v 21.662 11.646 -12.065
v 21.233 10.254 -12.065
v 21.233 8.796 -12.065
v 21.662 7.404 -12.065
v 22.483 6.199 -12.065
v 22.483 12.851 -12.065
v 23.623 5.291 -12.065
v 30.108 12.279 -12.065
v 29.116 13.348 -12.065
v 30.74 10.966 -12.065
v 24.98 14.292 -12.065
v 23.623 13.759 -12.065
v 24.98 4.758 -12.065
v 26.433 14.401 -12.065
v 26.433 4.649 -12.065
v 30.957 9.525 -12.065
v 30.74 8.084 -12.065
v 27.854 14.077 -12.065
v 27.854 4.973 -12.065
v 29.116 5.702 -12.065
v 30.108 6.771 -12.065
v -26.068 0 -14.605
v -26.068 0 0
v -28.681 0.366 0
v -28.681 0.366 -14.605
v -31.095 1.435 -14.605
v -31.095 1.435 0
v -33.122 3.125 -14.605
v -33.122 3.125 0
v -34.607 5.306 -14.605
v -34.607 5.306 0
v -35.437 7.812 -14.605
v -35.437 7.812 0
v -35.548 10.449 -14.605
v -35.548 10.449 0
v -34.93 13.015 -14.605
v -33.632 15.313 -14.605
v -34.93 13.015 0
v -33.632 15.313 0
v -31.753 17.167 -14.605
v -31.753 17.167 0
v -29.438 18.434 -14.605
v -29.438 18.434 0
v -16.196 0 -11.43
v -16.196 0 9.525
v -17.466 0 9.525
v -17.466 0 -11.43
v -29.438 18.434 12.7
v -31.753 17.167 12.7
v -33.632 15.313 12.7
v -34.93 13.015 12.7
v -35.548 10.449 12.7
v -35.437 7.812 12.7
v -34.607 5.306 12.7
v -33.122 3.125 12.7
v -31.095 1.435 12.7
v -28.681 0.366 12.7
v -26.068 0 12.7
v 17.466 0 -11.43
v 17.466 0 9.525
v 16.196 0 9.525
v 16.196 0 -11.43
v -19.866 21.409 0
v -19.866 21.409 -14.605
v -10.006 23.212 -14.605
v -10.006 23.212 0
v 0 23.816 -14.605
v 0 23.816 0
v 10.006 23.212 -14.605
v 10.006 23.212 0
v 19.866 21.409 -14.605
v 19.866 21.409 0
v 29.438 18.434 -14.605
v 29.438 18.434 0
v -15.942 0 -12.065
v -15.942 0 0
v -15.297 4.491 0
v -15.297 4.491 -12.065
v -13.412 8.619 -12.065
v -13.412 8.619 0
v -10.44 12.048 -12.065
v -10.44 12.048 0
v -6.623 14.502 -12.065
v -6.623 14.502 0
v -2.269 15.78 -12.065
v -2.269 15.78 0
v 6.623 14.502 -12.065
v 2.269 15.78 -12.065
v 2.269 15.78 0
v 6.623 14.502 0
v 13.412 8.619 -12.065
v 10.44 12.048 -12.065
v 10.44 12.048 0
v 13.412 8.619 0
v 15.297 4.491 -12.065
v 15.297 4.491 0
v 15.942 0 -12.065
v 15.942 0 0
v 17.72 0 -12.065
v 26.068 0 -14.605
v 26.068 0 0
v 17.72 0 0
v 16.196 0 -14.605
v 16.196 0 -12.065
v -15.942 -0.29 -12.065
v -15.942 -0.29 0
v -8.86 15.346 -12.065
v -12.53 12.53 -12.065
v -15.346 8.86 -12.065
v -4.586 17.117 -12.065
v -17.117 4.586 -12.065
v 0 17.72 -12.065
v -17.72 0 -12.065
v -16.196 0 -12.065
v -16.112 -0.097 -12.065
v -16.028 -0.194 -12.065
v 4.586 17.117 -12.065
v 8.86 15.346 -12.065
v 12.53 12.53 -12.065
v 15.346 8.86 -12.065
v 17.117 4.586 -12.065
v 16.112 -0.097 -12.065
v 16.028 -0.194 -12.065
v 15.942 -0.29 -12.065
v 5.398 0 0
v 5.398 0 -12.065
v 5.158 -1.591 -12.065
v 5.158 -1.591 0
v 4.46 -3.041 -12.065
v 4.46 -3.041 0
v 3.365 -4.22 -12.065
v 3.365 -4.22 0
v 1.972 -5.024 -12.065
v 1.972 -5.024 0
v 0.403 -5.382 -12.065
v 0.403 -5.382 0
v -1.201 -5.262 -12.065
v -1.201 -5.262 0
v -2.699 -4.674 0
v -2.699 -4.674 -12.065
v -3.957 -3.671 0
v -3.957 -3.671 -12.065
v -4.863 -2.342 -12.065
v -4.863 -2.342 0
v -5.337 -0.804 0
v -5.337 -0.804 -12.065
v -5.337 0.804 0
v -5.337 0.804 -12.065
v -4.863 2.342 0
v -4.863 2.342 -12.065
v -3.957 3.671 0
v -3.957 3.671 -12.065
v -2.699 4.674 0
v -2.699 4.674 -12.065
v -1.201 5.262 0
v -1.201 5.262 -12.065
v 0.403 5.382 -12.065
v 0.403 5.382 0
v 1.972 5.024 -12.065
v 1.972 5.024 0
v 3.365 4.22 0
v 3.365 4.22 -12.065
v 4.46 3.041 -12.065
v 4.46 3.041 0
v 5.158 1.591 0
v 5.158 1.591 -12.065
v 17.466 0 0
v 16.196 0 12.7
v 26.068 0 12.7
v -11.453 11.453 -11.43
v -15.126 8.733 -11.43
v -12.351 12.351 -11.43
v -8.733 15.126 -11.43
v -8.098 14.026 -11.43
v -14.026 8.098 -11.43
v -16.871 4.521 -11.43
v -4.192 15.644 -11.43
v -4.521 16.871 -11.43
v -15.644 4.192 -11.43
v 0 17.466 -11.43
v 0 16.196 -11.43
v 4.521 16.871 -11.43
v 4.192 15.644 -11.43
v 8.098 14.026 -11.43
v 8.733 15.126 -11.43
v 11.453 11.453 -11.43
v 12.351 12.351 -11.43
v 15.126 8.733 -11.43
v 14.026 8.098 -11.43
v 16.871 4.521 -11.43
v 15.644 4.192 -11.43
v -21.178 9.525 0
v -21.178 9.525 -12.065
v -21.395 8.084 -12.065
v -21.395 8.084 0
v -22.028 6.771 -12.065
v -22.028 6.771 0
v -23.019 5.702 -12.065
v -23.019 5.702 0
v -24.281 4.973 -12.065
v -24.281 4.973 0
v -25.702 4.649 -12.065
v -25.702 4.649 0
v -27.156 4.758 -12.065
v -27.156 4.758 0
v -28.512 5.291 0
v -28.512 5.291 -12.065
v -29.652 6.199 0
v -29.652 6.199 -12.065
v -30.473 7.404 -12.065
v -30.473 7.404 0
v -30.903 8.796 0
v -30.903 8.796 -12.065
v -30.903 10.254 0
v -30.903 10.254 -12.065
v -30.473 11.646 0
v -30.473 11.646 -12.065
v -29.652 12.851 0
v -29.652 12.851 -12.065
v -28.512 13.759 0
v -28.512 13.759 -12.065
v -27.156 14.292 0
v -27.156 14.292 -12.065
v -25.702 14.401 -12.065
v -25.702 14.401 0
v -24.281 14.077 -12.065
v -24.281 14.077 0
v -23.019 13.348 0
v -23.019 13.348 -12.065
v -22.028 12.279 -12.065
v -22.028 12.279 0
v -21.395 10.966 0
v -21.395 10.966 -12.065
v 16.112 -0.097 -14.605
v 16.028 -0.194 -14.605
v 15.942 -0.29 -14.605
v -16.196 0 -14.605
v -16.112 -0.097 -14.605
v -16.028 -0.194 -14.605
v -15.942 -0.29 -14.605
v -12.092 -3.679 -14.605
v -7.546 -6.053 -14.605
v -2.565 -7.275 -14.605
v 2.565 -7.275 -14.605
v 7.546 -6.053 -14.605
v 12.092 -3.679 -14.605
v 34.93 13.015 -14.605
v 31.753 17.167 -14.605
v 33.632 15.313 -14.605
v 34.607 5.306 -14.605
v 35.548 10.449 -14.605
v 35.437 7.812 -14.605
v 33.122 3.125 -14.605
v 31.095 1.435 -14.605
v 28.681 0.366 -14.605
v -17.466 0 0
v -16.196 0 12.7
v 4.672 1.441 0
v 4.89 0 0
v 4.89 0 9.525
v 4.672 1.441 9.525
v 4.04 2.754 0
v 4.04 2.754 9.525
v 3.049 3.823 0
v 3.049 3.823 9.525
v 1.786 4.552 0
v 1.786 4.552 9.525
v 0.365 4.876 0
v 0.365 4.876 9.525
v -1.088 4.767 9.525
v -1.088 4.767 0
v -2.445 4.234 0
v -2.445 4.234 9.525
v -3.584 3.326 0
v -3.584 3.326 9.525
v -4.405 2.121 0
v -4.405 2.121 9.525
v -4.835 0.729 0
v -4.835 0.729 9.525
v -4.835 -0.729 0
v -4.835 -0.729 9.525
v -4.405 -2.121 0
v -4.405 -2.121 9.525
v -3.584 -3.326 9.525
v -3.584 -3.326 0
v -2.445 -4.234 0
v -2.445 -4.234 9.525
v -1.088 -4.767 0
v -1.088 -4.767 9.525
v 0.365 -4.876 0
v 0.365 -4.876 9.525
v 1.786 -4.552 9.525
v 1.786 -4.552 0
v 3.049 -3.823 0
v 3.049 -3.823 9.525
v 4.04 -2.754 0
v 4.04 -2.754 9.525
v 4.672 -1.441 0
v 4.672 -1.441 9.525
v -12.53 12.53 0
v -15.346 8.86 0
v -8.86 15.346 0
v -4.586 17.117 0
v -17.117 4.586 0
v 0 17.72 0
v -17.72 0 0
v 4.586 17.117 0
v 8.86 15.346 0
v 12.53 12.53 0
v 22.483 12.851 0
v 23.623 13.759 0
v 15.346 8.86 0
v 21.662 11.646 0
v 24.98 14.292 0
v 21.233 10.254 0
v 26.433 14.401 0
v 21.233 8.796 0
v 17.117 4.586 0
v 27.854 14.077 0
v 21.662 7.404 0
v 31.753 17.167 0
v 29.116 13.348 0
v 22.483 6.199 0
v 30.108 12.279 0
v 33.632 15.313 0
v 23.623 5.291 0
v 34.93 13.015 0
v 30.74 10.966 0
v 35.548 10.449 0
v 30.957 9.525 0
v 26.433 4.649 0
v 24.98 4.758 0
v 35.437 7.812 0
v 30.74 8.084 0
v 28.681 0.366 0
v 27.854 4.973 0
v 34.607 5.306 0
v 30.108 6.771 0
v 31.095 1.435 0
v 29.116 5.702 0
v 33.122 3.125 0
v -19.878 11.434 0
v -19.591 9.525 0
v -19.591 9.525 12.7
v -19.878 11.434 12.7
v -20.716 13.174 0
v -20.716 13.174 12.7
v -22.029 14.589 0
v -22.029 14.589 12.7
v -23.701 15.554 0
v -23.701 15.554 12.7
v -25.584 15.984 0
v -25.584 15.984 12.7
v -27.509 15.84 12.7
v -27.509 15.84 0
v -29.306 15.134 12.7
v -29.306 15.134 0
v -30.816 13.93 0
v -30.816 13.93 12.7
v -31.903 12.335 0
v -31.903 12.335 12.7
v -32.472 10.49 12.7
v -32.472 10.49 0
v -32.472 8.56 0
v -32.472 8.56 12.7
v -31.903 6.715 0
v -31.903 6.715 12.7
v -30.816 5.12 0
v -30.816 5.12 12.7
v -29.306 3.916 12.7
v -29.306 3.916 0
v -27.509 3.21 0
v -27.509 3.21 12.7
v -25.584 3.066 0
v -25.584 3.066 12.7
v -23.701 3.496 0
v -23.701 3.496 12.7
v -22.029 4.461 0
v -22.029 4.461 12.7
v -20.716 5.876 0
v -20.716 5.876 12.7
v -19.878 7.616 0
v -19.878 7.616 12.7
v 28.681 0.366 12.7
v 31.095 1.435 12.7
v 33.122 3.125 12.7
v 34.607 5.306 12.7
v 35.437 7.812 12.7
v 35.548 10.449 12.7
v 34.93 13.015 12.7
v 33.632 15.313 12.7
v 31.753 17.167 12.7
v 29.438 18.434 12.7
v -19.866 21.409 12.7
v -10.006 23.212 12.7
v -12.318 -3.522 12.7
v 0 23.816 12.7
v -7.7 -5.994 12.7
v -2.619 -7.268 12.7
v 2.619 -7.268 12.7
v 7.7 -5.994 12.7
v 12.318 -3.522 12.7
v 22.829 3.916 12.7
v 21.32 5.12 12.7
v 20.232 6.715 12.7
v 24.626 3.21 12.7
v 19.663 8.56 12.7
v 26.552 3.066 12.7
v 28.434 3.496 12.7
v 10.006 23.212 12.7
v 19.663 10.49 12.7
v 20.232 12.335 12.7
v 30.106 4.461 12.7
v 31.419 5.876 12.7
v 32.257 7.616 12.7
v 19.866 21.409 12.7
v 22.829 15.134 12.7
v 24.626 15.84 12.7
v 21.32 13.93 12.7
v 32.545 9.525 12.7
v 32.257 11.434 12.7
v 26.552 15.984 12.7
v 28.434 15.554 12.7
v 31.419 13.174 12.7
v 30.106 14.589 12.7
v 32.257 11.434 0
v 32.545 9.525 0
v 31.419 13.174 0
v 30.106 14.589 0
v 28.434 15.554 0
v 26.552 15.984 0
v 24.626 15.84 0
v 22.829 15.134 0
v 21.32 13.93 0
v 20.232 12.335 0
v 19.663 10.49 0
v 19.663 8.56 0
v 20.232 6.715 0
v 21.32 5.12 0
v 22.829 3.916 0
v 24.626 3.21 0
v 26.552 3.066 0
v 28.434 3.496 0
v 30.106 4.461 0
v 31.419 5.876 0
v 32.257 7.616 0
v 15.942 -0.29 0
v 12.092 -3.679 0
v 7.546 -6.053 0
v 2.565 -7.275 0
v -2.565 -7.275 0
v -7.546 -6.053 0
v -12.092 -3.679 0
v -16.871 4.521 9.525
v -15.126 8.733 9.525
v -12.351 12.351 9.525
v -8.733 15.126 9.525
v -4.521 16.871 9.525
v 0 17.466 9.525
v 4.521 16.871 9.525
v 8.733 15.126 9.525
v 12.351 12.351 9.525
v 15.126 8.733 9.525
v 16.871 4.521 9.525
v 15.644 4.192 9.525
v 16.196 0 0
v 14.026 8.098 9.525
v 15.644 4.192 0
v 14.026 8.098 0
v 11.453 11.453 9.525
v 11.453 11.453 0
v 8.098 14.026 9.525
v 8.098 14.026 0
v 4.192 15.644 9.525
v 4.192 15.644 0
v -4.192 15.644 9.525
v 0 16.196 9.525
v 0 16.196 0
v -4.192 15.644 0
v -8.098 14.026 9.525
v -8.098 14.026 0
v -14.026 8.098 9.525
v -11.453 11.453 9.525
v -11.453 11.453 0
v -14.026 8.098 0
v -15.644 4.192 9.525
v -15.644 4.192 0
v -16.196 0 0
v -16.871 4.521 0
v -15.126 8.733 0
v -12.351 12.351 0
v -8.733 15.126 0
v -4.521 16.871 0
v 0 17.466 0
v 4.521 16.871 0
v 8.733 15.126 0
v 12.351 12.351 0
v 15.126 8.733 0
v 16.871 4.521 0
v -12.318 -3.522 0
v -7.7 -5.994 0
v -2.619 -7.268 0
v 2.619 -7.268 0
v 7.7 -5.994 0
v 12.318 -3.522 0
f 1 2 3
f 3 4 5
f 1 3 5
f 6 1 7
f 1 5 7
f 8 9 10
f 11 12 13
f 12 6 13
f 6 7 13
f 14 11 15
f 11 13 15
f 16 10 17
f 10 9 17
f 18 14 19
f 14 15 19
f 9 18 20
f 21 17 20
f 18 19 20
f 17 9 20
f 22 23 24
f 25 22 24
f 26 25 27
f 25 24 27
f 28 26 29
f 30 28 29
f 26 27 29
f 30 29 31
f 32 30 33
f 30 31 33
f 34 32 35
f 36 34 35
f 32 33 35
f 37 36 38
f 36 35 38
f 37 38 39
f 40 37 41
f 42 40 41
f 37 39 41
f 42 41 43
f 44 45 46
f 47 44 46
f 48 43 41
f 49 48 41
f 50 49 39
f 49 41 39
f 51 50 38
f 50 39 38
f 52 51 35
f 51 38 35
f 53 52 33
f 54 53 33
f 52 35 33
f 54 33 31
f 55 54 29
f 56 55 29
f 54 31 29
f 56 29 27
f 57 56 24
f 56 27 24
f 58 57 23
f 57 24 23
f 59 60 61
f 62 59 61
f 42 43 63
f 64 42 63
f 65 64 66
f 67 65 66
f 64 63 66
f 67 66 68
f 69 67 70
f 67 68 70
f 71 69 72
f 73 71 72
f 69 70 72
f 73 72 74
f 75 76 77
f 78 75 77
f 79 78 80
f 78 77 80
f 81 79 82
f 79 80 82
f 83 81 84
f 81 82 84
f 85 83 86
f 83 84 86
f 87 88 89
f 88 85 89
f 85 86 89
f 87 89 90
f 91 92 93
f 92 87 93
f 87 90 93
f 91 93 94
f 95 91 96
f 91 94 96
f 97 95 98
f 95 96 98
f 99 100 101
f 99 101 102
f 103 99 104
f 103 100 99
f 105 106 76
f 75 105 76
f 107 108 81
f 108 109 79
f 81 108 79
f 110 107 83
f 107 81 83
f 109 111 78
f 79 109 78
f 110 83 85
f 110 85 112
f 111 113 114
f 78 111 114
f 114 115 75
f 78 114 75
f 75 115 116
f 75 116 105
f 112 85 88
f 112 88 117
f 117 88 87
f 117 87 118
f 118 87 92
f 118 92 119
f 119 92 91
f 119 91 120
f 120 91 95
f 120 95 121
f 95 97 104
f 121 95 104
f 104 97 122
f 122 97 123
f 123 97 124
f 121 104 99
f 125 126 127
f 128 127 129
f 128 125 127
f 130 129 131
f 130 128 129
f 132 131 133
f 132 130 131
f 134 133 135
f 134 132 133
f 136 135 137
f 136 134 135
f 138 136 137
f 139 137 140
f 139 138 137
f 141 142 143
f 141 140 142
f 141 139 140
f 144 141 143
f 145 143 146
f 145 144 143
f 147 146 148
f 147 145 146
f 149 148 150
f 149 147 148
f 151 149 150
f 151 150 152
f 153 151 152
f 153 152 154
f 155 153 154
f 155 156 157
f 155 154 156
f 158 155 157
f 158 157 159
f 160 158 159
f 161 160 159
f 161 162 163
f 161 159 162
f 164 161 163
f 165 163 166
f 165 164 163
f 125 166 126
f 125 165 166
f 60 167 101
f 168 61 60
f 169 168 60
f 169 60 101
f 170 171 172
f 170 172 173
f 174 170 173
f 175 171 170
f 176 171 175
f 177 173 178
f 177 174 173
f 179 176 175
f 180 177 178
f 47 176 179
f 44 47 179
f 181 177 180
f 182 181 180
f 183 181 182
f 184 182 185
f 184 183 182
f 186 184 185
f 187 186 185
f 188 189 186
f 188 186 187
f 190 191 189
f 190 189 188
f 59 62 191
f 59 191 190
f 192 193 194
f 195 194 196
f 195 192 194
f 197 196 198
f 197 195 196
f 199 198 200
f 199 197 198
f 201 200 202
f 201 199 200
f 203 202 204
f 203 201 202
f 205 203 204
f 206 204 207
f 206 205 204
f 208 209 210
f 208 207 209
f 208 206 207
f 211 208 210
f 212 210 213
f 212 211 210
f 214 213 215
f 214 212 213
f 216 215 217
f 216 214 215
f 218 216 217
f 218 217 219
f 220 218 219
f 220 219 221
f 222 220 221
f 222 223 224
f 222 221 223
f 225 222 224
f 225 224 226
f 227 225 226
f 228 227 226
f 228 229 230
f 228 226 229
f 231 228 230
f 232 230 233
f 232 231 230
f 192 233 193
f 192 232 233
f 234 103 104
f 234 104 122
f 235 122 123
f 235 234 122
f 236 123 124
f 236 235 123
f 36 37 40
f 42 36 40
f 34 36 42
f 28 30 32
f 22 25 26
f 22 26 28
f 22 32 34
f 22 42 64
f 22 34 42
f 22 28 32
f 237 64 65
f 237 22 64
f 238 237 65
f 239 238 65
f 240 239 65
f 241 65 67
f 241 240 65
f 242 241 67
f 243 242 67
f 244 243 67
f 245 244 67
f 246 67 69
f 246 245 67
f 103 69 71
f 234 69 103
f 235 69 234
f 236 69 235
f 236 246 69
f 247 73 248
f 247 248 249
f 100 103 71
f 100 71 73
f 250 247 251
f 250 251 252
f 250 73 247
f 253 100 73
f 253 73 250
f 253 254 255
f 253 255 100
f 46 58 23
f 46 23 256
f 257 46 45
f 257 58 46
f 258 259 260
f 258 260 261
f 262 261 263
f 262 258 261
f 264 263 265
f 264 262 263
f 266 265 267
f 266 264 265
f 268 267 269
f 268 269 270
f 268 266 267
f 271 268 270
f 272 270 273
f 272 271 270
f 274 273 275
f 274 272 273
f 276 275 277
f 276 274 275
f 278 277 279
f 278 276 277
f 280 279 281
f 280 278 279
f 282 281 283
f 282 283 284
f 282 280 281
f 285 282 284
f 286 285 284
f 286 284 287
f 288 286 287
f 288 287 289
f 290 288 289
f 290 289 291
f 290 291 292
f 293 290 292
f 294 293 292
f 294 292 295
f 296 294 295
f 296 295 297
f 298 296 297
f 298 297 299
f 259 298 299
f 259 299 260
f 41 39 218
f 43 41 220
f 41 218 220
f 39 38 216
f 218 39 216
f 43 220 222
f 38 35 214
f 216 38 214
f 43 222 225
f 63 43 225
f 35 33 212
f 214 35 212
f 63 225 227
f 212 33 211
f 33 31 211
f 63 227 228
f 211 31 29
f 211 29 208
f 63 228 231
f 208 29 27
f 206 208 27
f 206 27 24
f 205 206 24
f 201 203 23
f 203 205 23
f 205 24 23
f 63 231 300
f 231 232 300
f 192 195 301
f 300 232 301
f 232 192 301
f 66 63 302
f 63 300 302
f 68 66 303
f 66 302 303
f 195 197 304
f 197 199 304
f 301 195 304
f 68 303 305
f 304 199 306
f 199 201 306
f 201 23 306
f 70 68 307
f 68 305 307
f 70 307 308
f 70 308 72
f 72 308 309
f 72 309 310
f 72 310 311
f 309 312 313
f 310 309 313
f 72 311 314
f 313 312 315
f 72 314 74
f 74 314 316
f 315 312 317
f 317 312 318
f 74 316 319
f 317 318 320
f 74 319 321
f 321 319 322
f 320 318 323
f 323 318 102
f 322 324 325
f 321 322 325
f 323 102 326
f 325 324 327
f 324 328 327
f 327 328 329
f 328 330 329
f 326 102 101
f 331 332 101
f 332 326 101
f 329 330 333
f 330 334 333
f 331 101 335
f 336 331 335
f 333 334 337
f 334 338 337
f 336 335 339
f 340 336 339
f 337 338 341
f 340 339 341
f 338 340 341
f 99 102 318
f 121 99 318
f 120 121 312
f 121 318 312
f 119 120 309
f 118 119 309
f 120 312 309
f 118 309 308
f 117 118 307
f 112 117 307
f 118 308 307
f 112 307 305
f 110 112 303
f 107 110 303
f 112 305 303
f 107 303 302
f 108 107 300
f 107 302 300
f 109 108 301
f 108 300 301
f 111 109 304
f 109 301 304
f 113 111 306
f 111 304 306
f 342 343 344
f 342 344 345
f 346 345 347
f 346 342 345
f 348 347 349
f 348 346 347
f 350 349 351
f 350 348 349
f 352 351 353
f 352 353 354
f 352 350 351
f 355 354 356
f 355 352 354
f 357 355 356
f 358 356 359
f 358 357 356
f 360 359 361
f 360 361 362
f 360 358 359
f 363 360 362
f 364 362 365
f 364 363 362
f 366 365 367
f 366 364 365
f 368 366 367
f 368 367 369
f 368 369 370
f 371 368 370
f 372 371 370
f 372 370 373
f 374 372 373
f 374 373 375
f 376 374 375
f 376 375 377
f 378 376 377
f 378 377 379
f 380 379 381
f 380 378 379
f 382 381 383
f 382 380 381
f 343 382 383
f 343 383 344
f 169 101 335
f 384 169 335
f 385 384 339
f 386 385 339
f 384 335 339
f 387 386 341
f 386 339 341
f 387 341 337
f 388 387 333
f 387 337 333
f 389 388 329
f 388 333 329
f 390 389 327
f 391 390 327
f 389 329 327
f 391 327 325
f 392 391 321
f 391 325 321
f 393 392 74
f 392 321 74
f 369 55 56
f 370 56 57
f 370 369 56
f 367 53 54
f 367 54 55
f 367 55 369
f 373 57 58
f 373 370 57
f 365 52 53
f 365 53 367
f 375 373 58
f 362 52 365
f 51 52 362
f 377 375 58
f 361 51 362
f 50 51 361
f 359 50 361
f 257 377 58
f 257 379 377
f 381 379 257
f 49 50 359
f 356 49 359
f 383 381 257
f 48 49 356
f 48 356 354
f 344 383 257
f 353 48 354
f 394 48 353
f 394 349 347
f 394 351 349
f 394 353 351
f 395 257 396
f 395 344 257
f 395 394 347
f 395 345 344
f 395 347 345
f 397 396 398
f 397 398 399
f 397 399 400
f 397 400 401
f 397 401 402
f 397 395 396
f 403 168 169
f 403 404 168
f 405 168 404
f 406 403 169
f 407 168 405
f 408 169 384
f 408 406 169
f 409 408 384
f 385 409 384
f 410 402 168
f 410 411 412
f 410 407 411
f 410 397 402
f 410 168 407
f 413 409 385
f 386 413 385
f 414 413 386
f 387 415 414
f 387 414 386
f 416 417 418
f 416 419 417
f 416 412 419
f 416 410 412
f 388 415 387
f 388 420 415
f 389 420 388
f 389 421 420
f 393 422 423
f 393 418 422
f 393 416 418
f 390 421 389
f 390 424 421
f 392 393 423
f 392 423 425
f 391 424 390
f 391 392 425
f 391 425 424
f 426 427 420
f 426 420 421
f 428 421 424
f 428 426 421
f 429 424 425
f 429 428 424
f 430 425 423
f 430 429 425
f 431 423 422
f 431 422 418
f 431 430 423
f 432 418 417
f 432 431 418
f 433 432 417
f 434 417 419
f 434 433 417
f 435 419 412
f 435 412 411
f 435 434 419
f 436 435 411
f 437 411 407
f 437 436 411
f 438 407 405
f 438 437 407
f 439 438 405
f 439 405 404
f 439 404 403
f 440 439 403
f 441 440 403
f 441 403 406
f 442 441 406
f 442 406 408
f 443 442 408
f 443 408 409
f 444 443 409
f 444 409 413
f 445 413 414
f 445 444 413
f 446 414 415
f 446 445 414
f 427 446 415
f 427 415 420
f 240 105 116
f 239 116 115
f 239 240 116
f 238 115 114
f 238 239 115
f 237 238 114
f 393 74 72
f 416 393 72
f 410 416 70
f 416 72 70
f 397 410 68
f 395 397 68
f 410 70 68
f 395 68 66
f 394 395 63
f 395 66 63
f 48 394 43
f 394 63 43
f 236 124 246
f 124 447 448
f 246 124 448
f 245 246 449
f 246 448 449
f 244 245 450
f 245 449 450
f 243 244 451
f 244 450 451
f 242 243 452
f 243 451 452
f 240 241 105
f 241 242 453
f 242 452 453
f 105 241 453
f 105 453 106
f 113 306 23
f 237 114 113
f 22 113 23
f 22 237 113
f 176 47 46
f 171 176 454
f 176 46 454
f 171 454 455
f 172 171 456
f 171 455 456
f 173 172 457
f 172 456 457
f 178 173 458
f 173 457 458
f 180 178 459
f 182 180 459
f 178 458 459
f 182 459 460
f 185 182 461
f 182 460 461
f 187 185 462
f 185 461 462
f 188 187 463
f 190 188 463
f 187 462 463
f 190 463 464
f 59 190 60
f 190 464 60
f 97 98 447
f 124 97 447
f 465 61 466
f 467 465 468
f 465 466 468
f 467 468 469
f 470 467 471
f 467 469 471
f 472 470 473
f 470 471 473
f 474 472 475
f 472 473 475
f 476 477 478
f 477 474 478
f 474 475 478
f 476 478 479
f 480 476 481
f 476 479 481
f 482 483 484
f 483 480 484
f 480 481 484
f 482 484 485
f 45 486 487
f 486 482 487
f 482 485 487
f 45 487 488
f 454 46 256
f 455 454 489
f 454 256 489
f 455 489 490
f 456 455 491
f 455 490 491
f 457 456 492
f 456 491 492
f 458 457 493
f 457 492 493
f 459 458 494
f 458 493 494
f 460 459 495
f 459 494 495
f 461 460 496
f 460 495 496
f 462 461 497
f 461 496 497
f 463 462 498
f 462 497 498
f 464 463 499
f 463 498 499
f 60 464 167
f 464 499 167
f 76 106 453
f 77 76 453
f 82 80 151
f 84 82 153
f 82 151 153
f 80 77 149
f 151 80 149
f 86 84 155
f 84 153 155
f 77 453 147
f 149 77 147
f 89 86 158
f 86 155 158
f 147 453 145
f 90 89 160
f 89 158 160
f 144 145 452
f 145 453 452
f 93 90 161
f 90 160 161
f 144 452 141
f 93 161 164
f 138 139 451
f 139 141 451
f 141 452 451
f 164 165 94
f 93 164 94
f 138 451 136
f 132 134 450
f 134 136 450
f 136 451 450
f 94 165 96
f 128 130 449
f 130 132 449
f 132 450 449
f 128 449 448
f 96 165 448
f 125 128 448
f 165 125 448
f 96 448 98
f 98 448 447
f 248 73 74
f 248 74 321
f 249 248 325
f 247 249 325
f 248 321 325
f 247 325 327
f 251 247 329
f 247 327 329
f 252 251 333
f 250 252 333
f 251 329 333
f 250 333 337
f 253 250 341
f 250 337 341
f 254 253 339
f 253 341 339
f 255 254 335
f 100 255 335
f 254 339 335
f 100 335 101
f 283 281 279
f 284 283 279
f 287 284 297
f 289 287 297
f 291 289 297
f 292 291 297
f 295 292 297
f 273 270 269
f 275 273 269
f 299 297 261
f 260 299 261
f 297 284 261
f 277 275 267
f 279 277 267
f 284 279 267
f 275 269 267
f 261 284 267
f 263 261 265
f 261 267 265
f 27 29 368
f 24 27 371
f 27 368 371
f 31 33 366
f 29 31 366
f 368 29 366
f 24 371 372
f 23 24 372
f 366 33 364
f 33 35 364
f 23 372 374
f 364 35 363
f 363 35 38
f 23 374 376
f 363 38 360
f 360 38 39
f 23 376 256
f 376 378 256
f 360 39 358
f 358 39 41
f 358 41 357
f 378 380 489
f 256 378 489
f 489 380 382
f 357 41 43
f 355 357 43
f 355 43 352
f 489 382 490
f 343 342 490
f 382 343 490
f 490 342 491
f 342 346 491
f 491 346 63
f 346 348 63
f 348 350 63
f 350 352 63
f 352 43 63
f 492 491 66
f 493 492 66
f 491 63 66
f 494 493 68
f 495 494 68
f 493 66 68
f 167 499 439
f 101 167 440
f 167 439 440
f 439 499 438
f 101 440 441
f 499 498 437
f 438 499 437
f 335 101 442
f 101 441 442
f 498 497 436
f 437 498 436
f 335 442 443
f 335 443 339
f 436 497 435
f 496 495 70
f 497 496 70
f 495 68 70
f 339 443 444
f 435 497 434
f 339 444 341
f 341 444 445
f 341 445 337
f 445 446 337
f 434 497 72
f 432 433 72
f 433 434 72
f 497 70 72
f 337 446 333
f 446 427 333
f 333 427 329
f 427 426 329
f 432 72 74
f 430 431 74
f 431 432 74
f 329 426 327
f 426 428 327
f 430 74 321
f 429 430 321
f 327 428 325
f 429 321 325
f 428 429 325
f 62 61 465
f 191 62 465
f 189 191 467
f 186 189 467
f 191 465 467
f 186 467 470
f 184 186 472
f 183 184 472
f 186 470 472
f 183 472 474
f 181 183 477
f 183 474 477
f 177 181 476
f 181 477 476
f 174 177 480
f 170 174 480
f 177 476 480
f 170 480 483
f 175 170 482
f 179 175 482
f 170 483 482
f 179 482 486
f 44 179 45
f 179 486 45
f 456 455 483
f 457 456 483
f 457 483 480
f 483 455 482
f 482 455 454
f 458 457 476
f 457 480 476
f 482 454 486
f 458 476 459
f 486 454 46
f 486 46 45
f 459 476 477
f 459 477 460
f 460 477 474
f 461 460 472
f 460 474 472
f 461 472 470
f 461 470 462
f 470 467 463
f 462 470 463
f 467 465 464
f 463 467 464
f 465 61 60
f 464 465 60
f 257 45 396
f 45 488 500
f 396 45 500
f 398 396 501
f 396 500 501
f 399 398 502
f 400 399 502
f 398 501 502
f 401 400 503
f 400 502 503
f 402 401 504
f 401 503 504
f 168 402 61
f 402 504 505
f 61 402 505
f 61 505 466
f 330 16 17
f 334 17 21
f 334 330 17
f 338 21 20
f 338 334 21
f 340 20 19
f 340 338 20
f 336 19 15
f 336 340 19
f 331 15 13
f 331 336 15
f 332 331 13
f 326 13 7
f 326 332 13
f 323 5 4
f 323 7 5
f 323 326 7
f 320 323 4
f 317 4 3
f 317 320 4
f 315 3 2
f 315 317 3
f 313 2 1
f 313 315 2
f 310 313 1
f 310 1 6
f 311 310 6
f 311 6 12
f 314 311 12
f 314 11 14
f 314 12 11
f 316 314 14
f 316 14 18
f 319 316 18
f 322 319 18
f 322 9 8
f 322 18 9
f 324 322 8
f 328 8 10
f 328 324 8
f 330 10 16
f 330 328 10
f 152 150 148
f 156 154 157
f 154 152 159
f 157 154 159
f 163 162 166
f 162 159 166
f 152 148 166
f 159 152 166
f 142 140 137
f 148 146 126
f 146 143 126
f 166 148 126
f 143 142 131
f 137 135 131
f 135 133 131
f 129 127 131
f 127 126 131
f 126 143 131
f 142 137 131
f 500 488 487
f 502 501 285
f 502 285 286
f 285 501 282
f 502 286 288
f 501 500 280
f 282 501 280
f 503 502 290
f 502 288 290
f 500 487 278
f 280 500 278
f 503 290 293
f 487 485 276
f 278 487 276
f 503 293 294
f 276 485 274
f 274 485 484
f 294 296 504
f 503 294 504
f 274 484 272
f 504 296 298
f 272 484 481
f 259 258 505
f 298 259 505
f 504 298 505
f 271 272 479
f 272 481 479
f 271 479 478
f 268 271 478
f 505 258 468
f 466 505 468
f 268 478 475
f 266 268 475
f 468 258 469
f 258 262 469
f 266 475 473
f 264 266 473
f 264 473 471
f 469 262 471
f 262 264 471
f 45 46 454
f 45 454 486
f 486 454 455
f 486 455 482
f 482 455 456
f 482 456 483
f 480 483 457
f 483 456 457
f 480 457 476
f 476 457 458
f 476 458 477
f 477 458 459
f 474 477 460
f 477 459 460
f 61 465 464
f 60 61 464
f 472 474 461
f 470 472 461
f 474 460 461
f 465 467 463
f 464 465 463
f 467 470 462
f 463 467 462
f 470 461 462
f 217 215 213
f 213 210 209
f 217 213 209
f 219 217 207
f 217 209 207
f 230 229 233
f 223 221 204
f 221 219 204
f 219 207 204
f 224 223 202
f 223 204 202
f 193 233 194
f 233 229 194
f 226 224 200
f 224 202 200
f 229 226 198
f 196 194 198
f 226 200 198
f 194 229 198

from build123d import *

# Parameters (mm, degrees)
F0_R     = 6.477
F0_R_2   = 4.8895
F1_DEPTH = 12.7
F2_R     = 4.8895
F3_DEPTH = 3.175
F5_DEPTH = 20.955
F6_R     = 4.8895
F6_R_2   = 5.3975
F7_DEPTH = 14.605
F9_DEPTH = 2.54


with BuildPart() as f1:
    # F0 (on Top) → F1 (new body)
    with BuildSketch(Plane.XY):
        with BuildLine():
            ThreePointArc((-17.46631, 0), (0, 17.46631), (17.46631, 0))
            Line((17.46631, 0), (26.067616, 0))
            ThreePointArc((26.067616, 0), (35.43728, 7.811812), (29.438114, 18.433724))
            ThreePointArc((29.438114, 18.433724), (0, 23.81631), (-29.438114, 18.433724))
            ThreePointArc((-29.438114, 18.433724), (-35.43728, 7.811812), (-26.067616, 0))
            Line((-26.067616, 0), (-17.46631, 0))
        make_face()
        with Locations((-26.067616, 9.525)):
            Circle(F0_R, mode=Mode.SUBTRACT)
        with Locations((26.067616, 9.525)):
            Circle(F0_R, mode=Mode.SUBTRACT)
        with BuildLine():
            ThreePointArc((-16.19631, 0), (0, -7.4295), (16.19631, 0))
            ThreePointArc((16.19631, 0), (0, 16.19631), (-16.19631, 0))
        make_face()
        Circle(F0_R_2, mode=Mode.SUBTRACT)
    extrude(amount=F1_DEPTH)

    # F2 (on face) → F3 (join)
    with BuildSketch(Plane.XY.offset(12.7)):
        with BuildLine():
            ThreePointArc((17.46631, 0), (0, 17.46631), (-17.46631, 0))
            Line((-17.46631, 0), (-16.19631, 0))
            ThreePointArc((-16.19631, 0), (0, 16.19631), (16.19631, 0))
            Line((16.19631, 0), (17.46631, 0))
        make_face()
        Circle(F2_R)
    extrude(amount=-F3_DEPTH)


with BuildPart() as f5:
    # F4 (on face) → F5 (new body)
    with BuildSketch(Plane(origin=(0, 0, 9.525), x_dir=(1, 0, 0), z_dir=(0, 0, -1))):
        with BuildLine():
            ThreePointArc((-17.46631, 0), (0, -17.46631), (17.46631, 0))
            Line((17.46631, 0), (16.19631, 0))
            ThreePointArc((16.19631, 0), (0, -16.19631), (-16.19631, 0))
            Line((-16.19631, 0), (-17.46631, 0))
        make_face()
    extrude(amount=F5_DEPTH)


with BuildPart() as f7:
    # F6 (on face) → F7 (new body)
    with BuildSketch(Plane(origin=(0, 0, 0), x_dir=(1, 0, 0), z_dir=(0, 0, -1))):
        with BuildLine():
            ThreePointArc((29.438114, -18.433724), (35.43728, -7.811812), (26.067616, 0))
            Line((26.067616, 0), (17.72031, 0))
            ThreePointArc((17.72031, 0), (0, -17.72031), (-17.72031, 0))
            Line((-17.72031, 0), (-26.067616, 0))
            ThreePointArc((-26.067616, 0), (-35.43728, -7.811812), (-29.438114, -18.433724))
            ThreePointArc((-29.438114, -18.433724), (0, -23.81631), (29.438114, -18.433724))
        make_face()
        with Locations((-26.067616, -9.525)):
            Circle(F6_R, mode=Mode.SUBTRACT)
        with Locations((26.067616, -9.525)):
            Circle(F6_R, mode=Mode.SUBTRACT)
        with BuildLine():
            Line((15.94231, 0), (15.94231, 0.289802))
            ThreePointArc((15.94231, 0.289802), (0, 7.4295), (-15.94231, 0.289802))
            Line((-15.94231, 0.289802), (-15.94231, 0))
            ThreePointArc((-15.94231, 0), (0, -15.94231), (15.94231, 0))
        make_face()
        Circle(F6_R_2, mode=Mode.SUBTRACT)
    extrude(amount=F7_DEPTH)

    # F8 (on face) → F9 (join)
    with BuildSketch(Plane(origin=(0, 0, -14.605), x_dir=(1, 0, 0), z_dir=(0, 0, -1))):
        with BuildLine():
            Line((-16.19631, 0), (-17.46631, 0))
            Line((-17.46631, 0), (-26.067616, 0))
            ThreePointArc((-26.067616, 0), (-35.43728, -7.811812), (-29.438114, -18.433724))
            ThreePointArc((-29.438114, -18.433724), (0, -23.81631), (29.438114, -18.433724))
            ThreePointArc((29.438114, -18.433724), (35.43728, -7.811812), (26.067616, 0))
            Line((26.067616, 0), (16.19631, 0))
            ThreePointArc((16.19631, 0), (0, 7.4295), (-16.19631, 0))
        make_face()
    extrude(amount=-F9_DEPTH)


solid = Compound([f1.part, f5.part, f7.part])
